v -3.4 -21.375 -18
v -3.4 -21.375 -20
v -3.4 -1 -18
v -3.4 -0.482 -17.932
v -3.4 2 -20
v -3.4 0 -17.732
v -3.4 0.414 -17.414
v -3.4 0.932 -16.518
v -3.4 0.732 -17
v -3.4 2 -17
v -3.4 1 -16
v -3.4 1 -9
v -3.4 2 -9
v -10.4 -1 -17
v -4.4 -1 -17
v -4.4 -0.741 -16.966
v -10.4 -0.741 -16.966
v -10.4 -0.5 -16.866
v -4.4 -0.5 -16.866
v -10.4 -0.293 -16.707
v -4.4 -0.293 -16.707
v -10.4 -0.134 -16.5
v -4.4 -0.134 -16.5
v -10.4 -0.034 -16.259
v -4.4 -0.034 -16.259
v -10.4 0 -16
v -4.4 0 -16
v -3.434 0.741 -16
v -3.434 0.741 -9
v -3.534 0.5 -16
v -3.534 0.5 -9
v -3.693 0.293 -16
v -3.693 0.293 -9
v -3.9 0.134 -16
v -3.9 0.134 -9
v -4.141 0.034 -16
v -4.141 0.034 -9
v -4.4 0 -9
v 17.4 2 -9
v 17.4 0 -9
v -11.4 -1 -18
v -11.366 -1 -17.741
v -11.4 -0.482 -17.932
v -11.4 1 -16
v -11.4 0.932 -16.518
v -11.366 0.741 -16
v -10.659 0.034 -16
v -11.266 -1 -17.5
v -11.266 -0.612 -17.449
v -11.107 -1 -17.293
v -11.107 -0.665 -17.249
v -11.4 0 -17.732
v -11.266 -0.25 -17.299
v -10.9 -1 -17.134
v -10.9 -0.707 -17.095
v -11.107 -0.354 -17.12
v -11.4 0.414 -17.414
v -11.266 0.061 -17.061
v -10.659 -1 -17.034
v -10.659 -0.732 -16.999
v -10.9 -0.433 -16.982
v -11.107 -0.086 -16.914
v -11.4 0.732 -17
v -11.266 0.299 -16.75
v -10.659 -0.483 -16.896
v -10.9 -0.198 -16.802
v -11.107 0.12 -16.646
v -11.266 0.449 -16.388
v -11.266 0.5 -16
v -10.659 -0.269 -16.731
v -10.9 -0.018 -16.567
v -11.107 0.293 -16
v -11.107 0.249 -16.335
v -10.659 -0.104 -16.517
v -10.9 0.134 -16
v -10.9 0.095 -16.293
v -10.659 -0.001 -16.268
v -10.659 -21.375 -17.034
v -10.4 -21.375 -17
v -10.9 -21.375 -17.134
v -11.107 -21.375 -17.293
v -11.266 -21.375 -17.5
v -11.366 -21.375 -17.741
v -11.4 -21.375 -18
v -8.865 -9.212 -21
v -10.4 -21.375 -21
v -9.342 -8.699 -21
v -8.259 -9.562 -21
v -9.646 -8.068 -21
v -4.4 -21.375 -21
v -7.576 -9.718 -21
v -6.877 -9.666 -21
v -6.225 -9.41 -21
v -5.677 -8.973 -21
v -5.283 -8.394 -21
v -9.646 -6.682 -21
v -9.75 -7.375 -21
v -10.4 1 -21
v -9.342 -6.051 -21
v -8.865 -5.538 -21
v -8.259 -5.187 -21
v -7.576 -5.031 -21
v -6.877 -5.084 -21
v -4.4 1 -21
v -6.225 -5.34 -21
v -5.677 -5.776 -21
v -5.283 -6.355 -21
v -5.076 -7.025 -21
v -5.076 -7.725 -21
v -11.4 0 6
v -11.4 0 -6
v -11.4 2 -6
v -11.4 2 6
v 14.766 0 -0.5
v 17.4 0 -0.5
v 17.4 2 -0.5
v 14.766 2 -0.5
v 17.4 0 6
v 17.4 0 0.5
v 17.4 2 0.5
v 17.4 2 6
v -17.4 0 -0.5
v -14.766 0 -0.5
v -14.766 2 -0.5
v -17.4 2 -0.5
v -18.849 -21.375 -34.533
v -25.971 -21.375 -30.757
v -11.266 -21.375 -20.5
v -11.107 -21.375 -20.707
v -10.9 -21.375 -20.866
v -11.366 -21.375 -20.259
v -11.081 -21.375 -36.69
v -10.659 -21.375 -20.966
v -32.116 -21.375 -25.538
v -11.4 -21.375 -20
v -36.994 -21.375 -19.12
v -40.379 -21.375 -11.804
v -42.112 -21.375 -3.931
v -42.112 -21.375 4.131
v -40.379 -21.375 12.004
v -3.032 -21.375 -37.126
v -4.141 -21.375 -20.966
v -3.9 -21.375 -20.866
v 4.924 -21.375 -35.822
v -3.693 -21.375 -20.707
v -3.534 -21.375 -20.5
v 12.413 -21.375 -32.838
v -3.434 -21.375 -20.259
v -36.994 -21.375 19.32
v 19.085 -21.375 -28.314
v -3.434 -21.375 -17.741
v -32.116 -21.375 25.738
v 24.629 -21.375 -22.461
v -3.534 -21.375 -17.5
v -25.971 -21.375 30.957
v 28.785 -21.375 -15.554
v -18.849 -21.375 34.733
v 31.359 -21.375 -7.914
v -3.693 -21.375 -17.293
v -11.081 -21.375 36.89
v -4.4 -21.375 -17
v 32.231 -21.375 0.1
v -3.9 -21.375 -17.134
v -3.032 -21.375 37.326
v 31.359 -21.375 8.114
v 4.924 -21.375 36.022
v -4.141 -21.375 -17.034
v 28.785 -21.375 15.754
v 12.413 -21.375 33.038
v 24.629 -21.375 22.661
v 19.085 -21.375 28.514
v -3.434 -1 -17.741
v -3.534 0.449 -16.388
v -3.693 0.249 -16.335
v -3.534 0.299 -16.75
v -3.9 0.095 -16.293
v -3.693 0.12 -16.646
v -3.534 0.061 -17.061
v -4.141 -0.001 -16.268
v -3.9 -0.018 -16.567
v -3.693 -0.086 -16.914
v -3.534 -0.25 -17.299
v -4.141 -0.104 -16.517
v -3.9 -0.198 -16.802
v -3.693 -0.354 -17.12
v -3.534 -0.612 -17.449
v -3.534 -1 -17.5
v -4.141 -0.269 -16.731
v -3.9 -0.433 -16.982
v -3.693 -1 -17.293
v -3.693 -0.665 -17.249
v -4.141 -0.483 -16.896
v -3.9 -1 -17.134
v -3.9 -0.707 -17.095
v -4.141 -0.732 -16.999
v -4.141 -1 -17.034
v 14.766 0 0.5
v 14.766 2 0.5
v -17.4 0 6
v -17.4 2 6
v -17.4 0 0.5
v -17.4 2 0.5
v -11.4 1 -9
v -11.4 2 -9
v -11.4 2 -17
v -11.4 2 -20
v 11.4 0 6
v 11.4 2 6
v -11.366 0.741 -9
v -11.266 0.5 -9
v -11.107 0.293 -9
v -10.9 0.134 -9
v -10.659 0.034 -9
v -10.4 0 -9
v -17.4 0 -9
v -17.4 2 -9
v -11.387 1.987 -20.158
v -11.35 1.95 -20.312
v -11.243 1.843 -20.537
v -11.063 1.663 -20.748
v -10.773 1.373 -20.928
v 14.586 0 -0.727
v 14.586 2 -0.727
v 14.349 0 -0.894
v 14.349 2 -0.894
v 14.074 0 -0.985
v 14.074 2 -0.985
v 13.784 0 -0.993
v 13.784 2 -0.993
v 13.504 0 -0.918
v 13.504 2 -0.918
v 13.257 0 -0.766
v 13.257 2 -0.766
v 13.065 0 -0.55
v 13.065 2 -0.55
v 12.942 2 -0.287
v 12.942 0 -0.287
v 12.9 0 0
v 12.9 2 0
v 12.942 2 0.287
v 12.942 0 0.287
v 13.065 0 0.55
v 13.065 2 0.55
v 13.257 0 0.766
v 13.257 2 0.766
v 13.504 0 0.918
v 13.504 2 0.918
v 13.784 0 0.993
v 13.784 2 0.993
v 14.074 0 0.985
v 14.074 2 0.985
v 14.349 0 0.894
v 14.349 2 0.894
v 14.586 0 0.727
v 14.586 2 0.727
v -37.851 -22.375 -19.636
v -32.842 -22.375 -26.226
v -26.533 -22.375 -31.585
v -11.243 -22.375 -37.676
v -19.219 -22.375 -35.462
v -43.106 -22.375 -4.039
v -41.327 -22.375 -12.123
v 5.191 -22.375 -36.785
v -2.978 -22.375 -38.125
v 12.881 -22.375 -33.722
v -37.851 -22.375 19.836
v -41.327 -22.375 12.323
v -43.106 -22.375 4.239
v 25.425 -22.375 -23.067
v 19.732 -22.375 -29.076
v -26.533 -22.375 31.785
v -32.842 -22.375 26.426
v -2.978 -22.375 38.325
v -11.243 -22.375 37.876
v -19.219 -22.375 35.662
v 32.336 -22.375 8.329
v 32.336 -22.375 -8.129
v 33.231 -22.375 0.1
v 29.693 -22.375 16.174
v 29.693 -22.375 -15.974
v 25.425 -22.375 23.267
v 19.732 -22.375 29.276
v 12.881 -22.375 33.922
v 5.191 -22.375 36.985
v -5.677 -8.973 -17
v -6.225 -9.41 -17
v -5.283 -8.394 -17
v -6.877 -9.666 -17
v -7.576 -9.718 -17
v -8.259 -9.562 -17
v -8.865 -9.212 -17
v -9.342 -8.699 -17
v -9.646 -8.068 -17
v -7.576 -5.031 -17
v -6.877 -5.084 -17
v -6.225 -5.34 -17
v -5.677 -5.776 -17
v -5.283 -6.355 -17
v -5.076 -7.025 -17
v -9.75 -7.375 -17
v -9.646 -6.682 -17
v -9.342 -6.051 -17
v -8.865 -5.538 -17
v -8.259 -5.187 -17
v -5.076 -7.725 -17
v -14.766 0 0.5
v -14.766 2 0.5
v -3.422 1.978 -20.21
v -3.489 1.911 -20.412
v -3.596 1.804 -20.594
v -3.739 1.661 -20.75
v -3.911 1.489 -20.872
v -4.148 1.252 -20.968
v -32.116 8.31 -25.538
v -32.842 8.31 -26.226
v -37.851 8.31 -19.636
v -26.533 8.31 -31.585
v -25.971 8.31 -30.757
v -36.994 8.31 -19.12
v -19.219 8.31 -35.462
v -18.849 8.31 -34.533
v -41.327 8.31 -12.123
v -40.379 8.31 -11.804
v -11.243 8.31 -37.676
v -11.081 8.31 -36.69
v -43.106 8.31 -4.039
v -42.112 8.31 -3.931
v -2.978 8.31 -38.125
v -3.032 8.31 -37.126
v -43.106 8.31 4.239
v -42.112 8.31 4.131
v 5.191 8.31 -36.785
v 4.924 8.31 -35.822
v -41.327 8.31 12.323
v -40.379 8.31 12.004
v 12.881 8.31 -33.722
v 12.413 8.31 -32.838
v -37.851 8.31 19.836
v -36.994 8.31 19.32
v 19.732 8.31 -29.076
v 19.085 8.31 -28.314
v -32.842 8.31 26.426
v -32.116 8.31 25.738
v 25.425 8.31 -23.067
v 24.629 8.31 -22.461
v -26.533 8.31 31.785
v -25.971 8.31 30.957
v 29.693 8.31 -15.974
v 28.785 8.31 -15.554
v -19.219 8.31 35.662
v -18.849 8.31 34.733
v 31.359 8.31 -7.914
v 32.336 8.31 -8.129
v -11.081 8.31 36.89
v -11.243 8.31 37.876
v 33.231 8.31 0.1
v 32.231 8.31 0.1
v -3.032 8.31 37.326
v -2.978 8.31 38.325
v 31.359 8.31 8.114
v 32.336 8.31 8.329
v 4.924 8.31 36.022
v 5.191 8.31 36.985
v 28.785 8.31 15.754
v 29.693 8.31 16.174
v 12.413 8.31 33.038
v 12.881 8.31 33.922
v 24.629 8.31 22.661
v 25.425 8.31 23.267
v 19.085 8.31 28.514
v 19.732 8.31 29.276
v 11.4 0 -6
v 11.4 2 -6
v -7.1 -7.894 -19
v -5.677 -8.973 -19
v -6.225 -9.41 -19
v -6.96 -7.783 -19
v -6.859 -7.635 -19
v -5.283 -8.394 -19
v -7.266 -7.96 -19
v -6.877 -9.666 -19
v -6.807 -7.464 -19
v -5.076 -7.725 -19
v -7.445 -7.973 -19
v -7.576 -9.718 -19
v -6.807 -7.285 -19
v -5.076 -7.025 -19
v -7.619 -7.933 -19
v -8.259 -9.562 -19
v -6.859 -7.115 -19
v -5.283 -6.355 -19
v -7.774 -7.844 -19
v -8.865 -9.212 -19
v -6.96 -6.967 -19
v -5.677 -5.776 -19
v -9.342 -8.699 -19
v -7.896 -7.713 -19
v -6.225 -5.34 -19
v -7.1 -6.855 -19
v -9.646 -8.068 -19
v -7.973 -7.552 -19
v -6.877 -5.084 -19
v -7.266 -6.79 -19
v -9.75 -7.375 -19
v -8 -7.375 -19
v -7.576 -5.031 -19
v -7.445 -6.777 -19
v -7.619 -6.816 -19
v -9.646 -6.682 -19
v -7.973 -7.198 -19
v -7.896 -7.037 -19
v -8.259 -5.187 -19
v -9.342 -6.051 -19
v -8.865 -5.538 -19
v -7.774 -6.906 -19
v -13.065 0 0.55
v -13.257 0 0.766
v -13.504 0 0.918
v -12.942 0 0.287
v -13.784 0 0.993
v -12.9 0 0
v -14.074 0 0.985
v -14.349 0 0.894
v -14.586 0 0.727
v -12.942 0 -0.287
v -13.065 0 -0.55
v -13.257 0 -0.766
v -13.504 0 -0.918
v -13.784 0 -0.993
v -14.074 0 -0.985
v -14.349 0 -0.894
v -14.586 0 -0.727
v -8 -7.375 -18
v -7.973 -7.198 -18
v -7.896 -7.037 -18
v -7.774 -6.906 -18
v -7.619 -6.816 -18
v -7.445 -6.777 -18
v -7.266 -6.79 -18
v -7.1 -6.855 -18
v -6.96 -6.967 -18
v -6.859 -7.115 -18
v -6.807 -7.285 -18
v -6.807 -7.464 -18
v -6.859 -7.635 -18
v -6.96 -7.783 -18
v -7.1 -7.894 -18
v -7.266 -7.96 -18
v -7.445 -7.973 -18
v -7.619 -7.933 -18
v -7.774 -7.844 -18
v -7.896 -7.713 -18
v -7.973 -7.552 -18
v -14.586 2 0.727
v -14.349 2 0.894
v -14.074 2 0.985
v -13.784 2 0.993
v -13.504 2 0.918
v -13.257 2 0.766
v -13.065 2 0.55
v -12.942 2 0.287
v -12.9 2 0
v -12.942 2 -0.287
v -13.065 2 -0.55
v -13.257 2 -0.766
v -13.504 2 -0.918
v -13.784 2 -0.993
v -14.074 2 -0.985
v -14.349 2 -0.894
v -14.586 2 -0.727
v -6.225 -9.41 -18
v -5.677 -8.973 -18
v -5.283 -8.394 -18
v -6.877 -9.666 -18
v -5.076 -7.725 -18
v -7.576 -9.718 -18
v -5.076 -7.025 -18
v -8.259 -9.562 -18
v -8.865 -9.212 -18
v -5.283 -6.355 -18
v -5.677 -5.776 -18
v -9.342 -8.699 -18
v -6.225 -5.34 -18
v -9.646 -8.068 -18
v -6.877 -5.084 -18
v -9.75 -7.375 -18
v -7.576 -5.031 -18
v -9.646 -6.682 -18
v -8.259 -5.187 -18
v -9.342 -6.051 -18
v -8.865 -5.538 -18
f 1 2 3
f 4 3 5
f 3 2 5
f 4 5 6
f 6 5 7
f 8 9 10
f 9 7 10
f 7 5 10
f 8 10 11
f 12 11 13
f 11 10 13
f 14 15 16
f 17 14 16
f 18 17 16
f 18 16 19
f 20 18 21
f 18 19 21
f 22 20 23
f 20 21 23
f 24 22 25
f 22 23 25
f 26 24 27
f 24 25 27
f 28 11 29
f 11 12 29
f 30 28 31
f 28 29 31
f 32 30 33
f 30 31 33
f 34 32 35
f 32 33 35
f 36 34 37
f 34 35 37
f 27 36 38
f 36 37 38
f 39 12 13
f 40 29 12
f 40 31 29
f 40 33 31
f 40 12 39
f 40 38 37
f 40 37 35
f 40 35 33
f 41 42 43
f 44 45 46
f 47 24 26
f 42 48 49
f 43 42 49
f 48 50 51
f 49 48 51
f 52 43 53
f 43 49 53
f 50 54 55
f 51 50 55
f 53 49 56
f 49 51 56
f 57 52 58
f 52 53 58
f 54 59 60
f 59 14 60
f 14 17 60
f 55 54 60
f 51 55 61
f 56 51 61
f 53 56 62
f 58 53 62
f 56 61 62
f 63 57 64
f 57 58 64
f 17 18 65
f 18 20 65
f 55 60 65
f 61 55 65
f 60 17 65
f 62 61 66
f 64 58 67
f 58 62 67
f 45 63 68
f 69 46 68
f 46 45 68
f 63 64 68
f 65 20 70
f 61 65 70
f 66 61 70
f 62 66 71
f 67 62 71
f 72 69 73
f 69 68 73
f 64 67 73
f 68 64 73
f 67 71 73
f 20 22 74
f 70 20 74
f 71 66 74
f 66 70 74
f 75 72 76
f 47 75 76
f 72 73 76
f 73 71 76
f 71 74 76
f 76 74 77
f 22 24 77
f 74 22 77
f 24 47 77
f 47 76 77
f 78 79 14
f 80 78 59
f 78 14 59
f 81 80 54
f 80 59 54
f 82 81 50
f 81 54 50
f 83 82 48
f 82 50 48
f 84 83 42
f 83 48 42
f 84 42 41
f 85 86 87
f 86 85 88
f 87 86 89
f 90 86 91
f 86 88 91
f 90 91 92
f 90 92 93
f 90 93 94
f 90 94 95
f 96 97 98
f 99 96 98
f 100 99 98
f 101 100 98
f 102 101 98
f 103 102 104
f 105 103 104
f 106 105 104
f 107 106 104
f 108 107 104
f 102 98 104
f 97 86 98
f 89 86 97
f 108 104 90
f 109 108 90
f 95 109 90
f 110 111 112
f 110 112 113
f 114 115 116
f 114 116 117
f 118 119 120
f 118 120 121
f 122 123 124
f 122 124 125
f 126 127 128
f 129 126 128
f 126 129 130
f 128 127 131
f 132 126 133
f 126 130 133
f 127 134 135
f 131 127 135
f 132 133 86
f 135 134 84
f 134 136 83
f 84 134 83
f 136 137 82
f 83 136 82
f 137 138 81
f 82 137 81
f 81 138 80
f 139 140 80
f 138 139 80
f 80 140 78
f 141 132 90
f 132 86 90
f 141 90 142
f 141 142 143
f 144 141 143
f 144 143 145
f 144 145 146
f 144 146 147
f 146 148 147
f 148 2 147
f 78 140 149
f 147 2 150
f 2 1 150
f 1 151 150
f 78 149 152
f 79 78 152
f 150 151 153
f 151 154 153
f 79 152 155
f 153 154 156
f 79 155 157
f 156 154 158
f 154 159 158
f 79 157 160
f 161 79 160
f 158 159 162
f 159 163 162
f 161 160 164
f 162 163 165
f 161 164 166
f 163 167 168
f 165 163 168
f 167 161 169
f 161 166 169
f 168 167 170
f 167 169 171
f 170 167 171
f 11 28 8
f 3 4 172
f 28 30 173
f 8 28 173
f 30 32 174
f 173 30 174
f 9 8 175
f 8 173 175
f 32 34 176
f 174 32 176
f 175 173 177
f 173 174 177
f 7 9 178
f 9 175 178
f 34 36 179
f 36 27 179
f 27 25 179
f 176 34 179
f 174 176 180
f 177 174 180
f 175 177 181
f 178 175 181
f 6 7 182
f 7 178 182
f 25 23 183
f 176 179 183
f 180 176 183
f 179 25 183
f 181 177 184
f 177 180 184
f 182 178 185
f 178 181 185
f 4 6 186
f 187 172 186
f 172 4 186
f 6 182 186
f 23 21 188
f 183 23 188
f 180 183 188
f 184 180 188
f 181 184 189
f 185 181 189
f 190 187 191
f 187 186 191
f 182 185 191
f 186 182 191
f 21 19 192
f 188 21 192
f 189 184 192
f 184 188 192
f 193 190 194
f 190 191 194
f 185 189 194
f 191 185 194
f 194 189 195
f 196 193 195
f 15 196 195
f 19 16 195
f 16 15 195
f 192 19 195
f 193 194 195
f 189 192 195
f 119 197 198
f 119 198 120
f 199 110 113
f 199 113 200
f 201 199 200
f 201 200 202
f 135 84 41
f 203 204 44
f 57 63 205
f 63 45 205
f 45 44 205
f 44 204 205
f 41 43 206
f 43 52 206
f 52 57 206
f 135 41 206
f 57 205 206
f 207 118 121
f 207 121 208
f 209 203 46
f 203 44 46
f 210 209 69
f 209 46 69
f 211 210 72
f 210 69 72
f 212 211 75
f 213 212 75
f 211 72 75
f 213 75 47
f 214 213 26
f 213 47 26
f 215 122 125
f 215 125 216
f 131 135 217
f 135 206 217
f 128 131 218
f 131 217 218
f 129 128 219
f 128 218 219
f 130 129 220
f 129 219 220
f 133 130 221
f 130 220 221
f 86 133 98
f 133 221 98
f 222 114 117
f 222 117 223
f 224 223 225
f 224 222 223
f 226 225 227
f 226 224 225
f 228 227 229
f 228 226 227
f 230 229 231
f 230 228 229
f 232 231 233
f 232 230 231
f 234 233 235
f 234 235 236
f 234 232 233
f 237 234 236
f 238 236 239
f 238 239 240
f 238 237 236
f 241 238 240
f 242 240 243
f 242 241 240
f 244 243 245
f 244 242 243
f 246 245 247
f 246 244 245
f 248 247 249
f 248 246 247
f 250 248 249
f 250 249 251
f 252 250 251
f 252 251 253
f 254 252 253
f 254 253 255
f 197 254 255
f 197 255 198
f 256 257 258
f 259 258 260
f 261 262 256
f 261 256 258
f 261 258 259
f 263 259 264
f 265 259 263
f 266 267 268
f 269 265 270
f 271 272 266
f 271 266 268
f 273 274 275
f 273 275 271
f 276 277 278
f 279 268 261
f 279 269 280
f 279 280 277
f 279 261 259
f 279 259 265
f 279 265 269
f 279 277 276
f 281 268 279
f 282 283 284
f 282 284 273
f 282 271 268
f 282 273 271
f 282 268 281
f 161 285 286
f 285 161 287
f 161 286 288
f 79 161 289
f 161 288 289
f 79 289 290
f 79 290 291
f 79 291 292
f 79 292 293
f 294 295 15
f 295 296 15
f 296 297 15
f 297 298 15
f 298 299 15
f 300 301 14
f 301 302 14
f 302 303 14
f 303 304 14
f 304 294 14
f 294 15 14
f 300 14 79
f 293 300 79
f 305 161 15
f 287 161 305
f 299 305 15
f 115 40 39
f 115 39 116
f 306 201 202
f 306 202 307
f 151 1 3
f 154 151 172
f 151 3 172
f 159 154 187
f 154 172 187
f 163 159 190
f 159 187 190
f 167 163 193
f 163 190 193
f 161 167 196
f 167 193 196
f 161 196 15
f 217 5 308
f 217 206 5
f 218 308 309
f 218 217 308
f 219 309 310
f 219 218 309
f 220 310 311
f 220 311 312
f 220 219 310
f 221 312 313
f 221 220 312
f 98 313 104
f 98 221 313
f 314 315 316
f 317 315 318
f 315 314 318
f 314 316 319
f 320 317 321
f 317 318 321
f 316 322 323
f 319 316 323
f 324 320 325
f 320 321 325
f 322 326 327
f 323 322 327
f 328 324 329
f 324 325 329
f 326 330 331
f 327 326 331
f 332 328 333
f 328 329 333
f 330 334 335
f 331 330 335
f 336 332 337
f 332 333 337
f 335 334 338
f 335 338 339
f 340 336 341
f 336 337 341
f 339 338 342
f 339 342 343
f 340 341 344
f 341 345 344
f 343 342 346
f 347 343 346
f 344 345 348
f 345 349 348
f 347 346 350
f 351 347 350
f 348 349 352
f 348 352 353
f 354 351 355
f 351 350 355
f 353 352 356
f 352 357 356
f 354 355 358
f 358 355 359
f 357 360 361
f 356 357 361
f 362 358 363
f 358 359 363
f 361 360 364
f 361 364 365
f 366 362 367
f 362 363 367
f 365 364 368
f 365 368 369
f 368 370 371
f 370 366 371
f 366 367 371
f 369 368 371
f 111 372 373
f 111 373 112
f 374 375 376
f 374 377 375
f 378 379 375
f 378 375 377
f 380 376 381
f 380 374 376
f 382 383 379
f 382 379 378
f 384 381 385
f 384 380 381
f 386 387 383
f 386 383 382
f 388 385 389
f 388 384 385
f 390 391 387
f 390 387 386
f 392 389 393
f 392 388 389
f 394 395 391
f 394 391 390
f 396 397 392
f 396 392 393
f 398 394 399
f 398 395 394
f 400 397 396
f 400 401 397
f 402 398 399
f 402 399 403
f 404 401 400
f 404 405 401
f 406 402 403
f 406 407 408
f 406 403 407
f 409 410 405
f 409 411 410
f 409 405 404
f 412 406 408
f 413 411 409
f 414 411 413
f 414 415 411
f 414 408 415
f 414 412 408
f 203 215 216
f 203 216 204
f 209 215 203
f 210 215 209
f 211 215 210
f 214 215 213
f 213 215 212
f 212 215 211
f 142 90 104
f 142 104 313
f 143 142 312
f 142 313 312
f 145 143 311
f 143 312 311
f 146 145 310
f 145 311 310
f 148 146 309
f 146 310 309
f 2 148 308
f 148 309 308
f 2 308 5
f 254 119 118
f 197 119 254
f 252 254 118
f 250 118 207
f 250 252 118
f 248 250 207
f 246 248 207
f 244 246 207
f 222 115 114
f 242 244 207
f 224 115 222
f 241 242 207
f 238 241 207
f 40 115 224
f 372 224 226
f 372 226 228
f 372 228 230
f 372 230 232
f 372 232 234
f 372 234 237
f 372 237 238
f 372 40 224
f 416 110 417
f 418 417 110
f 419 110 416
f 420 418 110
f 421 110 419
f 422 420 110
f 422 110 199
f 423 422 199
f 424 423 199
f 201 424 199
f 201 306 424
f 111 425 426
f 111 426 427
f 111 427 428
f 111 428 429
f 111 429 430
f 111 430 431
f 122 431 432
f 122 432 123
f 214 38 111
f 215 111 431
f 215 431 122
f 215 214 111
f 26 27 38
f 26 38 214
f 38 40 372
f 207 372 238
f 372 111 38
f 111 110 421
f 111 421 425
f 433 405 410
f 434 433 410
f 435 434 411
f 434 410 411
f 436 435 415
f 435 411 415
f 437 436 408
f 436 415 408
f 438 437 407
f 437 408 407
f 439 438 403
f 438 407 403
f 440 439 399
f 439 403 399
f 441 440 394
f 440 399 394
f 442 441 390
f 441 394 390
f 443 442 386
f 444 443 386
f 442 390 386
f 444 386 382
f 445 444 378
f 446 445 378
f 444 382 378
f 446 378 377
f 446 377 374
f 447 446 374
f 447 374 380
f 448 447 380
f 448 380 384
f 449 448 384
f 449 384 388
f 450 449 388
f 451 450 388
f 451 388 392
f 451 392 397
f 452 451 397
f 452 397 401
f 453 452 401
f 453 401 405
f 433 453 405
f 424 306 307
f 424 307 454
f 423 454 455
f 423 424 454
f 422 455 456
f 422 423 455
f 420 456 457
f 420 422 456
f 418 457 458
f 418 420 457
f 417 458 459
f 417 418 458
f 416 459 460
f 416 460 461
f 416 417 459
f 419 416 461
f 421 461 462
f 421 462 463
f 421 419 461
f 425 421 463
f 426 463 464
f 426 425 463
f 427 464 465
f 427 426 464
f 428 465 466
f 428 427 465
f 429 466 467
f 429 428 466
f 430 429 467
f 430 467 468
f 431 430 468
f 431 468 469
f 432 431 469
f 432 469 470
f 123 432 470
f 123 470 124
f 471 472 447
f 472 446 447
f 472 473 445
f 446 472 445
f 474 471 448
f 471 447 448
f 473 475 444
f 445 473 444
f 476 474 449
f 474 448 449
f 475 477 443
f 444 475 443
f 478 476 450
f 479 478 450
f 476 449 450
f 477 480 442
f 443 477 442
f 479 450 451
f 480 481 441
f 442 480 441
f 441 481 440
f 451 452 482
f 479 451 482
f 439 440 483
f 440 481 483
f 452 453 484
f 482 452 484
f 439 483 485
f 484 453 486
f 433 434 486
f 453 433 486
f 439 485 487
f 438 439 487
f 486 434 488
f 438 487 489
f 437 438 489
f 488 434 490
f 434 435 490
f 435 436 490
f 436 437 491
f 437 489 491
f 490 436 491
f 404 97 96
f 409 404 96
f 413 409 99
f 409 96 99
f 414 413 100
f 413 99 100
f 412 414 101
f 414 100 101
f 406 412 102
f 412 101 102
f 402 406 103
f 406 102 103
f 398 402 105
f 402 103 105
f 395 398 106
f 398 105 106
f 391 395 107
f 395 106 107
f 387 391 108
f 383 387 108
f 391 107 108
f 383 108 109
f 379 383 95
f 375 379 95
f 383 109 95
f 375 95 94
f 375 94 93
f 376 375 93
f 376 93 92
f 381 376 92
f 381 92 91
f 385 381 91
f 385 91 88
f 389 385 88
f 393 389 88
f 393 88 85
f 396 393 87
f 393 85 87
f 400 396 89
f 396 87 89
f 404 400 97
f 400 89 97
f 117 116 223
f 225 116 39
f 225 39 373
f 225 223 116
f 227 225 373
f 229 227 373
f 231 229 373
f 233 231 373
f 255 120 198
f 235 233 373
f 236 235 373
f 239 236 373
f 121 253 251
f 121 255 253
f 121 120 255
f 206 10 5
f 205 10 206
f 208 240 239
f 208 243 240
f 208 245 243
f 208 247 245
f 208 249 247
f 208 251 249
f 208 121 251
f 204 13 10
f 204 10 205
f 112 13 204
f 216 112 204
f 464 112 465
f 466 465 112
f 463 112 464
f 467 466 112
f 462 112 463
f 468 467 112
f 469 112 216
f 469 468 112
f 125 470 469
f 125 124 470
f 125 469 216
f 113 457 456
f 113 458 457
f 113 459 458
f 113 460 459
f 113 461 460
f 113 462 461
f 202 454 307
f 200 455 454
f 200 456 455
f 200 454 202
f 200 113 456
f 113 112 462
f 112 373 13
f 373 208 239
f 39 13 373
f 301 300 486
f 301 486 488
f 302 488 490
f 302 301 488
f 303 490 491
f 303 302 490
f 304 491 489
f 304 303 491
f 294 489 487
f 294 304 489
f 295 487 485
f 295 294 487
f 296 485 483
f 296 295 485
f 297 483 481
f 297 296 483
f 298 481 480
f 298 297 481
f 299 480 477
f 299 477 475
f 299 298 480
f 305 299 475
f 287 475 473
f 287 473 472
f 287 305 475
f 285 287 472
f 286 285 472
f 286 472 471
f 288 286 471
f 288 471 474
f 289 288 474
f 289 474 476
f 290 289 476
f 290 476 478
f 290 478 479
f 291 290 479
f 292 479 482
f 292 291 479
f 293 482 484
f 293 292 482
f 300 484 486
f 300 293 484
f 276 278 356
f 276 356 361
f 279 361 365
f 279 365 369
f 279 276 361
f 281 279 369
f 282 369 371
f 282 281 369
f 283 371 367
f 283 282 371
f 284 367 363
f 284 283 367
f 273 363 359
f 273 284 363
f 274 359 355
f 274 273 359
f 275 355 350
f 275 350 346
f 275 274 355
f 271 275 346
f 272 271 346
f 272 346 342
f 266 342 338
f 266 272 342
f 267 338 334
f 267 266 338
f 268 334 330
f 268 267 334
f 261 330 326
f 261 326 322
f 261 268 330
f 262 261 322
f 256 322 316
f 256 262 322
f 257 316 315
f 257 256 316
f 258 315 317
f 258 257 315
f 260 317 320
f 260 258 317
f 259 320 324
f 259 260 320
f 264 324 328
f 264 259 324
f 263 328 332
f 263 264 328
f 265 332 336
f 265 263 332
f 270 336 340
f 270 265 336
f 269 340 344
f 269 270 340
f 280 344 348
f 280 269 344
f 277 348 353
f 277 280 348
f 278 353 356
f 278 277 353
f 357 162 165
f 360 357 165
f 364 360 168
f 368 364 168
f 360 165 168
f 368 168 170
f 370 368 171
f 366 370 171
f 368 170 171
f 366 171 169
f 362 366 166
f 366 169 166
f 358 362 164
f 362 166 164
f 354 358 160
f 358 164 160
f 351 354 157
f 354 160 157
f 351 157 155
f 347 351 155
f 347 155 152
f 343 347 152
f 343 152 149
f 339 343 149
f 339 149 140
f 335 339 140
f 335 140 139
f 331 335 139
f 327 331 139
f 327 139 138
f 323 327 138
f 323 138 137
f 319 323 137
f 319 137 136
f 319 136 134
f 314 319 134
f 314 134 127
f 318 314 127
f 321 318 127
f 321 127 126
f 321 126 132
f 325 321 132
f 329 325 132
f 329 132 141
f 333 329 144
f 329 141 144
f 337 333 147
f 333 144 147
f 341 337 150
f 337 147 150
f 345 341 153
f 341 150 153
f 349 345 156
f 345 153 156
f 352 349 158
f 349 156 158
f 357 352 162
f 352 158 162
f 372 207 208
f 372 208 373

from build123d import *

# Parameters (mm, degrees)
BOSS_EXTRUDE1_DEPTH = 2
SKETCH3_W           = 8
SKETCH3_H           = 13.374853929
BOSS_EXTRUDE2_DEPTH = 4
FILLET1_R           = 1
SKETCH4_R           = 2.35
SKETCH4_R_2         = 0.6
CUT_EXTRUDE1_DEPTH  = 2
SKETCH4_4_R         = 0.6
CUT_EXTRUDE2_DEPTH  = 4
CUT_EXTRUDE3_START  = -4
SKETCH4_5_R         = 2.35
SKETCH4_5_R_2       = 0.6
CUT_EXTRUDE3_DEPTH  = 1
BOSS_EXTRUDE3_START = 10
SKETCH6_R           = 37.280765685
BOSS_EXTRUDE3_DEPTH = 1
EXTRUDE_THIN1_START = 11
SKETCH6_2_R         = 38.280765685
SKETCH6_2_R_2       = 37.280765685
EXTRUDE_THIN1_DEPTH = 30.684854
BOSS_EXTRUDE4_DEPTH = 10


with BuildPart() as part:
    # Sketch1 → Boss-Extrude1 (new body)
    with BuildSketch(Plane(origin=(0, 0, 0), x_dir=(1, 0, 0), z_dir=(0, 1, 0))):
        with BuildLine():
            Line((-11.4, -6), (-17.4, -6))
            Line((-17.4, -6), (-17.4, -0.5))
            Line((-17.4, -0.5), (-14.766025404, -0.5))
            ThreePointArc((-14.766025404, -0.5), (-12.9, 0), (-14.766025404, 0.5))
            Line((-14.766025404, 0.5), (-17.4, 0.5))
            Line((-17.4, 0.5), (-17.4, 9))
            Line((-17.4, 9), (-11.4, 9))
            Line((-11.4, 9), (-11.4, 17))
            Line((-11.4, 17), (-3.4, 17))
            Line((-3.4, 17), (-3.4, 9))
            Line((-3.4, 9), (17.4, 9))
            Line((17.4, 9), (17.4, 0.5))
            Line((17.4, 0.5), (14.766025404, 0.5))
            ThreePointArc((14.766025404, 0.5), (12.9, 0), (14.766025404, -0.5))
            Line((14.766025404, -0.5), (17.4, -0.5))
            Line((17.4, -0.5), (17.4, -6))
            Line((17.4, -6), (11.4, -6))
            Line((11.4, -6), (11.4, 6))
            Line((11.4, 6), (-11.4, 6))
            Line((-11.4, 6), (-11.4, -6))
        make_face()
    extrude(amount=BOSS_EXTRUDE1_DEPTH)

    # Sketch3 → Boss-Extrude2 (add)
    with BuildSketch(Plane(origin=(0, 0, -17), x_dir=(-1, 0, 0), z_dir=(0, 0, -1))):
        with Locations((7.4, -4.687426965)):
            Rectangle(SKETCH3_W, SKETCH3_H)
    extrude(amount=BOSS_EXTRUDE2_DEPTH)

    # Fillet1
    fillet1_edges = [part.edges().sort_by_distance(p)[0] for p in [
        (-11.4, 0, -13),
        (-7.4, 0, -17),
        (-3.4, 0, -13),
        (-3.4, -5.687426964, -17),
        (-11.4, -5.687426964, -17),
        (-3.4, -4.687426964, -21),
        (-11.4, -4.687426964, -21),
        (-7.4, 2, -21),
    ]]
    fillet(fillet1_edges, radius=FILLET1_R)

    # Sketch4 → Cut-Extrude1 (cut)
    with BuildSketch(Plane(origin=(0, 0, -21), x_dir=(-1, 0, 0), z_dir=(0, 0, -1))):
        with Locations((7.4, -7.374853929)):
            Circle(SKETCH4_R)
        with Locations((7.4, -7.374853929)):
            Circle(SKETCH4_R_2, mode=Mode.SUBTRACT)
        with Locations((7.4, -7.374853929)):
            Circle(SKETCH4_R_2)
    extrude(amount=-CUT_EXTRUDE1_DEPTH, mode=Mode.SUBTRACT)

    # Sketch4<4> → Cut-Extrude2 (cut)
    with BuildSketch(Plane(origin=(0, 0, -21), x_dir=(-1, 0, 0), z_dir=(0, 0, -1))):
        with Locations((7.4, -7.374853929)):
            Circle(SKETCH4_4_R)
    extrude(amount=-CUT_EXTRUDE2_DEPTH, mode=Mode.SUBTRACT)

    # Sketch4<5> → Cut-Extrude3 (cut)
    with BuildSketch(Plane(origin=(0, 0, -21), x_dir=(-1, 0, 0), z_dir=(0, 0, -1)).offset(CUT_EXTRUDE3_START)):
        with Locations((7.4, -7.374853929)):
            Circle(SKETCH4_5_R)
        with Locations((7.4, -7.374853929)):
            Circle(SKETCH4_5_R_2, mode=Mode.SUBTRACT)
    extrude(amount=CUT_EXTRUDE3_DEPTH, mode=Mode.SUBTRACT)



with BuildPart() as body_2:
    # Sketch6 → Boss-Extrude3 (new body)
    with BuildSketch(Plane.XZ.offset(11.374853929).offset(BOSS_EXTRUDE3_START)):
        with Locations((-5.05, 0.1)):
            Circle(SKETCH6_R)
    extrude(amount=BOSS_EXTRUDE3_DEPTH)

    # Sketch6<2> → Extrude-Thin1 (add)
    with BuildSketch(Plane.XZ.offset(11.374853929).offset(EXTRUDE_THIN1_START)):
        with Locations((-5.05, 0.1)):
            Circle(SKETCH6_2_R)
        with Locations((-5.05, 0.1)):
            Circle(SKETCH6_2_R_2, mode=Mode.SUBTRACT)
    extrude(amount=-EXTRUDE_THIN1_DEPTH)


with BuildPart() as part_1:
    add(part.part)

    add(body_2.part)  # Boss-Extrude4 merges body 2
    # Sketch7 → Boss-Extrude4 (add)
    with BuildSketch(Plane.XZ.offset(11.374853929)):
        with BuildLine():
            Line((-3.4, -20), (-3.4, -18))
            ThreePointArc((-3.4, -18), (-3.692893219, -17.292893219), (-4.4, -17))
            Line((-4.4, -17), (-10.4, -17))
            ThreePointArc((-10.4, -17), (-11.107106781, -17.292893219), (-11.4, -18))
            Line((-11.4, -18), (-11.4, -20))
            ThreePointArc((-11.4, -20), (-11.107106781, -20.707106781), (-10.4, -21))
            Line((-10.4, -21), (-4.4, -21))
            ThreePointArc((-4.4, -21), (-3.692893219, -20.707106781), (-3.4, -20))
        make_face()
    extrude(amount=BOSS_EXTRUDE4_DEPTH)


solid = part_1.part
